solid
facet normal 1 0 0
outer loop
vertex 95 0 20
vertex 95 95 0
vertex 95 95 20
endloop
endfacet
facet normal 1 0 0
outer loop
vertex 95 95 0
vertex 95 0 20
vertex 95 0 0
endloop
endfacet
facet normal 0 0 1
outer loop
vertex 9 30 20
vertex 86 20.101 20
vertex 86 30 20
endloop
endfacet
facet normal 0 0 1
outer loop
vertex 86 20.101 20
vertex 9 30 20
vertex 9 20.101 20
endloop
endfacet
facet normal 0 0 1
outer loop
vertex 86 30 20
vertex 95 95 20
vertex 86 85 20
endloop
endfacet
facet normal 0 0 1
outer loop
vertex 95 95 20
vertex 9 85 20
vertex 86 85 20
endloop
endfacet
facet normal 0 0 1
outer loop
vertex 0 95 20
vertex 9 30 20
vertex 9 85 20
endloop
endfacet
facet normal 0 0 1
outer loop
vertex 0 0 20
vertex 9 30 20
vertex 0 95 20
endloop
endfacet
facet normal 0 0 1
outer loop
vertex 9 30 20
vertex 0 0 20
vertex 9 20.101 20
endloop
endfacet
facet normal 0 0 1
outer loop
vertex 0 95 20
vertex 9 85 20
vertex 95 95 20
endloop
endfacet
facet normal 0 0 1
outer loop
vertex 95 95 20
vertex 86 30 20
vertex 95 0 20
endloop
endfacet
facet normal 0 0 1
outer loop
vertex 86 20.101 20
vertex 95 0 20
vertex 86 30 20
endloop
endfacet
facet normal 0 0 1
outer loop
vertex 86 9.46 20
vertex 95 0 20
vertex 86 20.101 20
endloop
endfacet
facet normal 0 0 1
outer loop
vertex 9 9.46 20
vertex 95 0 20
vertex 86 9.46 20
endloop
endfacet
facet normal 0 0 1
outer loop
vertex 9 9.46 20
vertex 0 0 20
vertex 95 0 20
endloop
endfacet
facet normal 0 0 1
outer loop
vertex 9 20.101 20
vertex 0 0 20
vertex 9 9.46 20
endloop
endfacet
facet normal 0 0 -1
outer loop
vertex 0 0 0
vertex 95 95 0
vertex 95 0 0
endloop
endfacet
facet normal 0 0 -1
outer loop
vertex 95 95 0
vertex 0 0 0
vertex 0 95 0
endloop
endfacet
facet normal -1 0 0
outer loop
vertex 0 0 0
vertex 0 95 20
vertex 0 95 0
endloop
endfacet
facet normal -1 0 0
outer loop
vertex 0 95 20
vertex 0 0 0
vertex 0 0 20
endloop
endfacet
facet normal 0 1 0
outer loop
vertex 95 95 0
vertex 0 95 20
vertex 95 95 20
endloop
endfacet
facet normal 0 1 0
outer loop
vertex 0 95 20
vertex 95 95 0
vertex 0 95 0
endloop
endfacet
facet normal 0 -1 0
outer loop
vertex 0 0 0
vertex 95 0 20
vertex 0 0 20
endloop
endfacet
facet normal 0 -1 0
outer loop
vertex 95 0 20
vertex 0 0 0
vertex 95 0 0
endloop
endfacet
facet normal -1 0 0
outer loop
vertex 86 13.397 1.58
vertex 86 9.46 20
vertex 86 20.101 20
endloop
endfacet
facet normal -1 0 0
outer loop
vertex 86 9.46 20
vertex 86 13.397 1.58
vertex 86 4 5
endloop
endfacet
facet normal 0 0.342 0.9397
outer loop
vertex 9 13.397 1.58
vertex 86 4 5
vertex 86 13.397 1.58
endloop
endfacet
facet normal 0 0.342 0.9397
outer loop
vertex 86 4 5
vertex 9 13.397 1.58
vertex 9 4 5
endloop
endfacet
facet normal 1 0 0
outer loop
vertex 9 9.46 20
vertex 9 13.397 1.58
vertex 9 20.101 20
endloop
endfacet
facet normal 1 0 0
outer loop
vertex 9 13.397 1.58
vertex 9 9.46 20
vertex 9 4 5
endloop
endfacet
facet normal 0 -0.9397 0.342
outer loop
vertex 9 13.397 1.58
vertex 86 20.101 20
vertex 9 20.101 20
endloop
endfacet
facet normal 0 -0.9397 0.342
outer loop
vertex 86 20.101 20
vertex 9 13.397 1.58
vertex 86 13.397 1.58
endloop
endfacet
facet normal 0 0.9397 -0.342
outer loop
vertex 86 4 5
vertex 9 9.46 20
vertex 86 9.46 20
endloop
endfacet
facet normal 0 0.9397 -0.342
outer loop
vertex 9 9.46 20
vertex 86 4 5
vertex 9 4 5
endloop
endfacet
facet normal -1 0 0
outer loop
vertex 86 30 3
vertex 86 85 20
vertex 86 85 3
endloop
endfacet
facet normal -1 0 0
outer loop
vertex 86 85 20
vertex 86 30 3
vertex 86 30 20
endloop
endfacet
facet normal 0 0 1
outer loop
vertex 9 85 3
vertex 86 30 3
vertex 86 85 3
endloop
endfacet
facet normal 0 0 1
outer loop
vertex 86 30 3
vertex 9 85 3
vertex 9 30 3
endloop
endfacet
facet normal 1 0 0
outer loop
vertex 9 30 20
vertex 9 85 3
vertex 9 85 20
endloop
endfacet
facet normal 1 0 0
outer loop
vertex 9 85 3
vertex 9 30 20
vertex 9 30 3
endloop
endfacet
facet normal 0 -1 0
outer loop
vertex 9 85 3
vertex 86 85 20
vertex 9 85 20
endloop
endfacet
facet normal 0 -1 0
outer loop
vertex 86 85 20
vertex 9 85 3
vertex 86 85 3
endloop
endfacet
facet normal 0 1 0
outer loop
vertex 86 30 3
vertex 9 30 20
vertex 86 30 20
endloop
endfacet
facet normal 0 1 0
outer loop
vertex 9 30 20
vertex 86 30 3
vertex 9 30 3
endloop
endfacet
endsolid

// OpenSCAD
// All measurements are in mm.

// The width of the phone. Include the case if you want to dock with it on.
phone_width = 76;

// The thickness of the phone.
phone_depth = 9;

// The amount of space to leave around the phone on each side.
buffer = .5;

// How much wider than the phone to make the base.
base_width_scale = 1.25;

// The height of the base relative to the phone's width. If both scale values are the same, the base will be square.
base_height_scale = 1.25;

// The thickness of the base.
base_depth = 20;

// The calculated dimensions of the base.
base_width = phone_width * base_width_scale;
base_height = phone_width * base_height_scale;

// Angle of the phone slot. Zero is straight up.
slot_angle = 20;

// Slot height tweak.
slot_y_tweak = 4;

// Slot depth tweak.
slot_z_tweak = 5;

difference() {

    // base cube
    cube([base_width, base_height, base_depth]);

    // phone slot
    translate([
        (base_width - phone_width - (buffer * 2)) / 2,
        slot_y_tweak,
        slot_z_tweak
    ]) {
        rotate([-slot_angle, 0 , 0]) {
            cube([
                phone_width + (buffer * 2),
                phone_depth + (buffer * 2),
                100
            ]);
        }
    }

    // tray
    translate([
        (base_width - phone_width - (buffer * 2)) / 2,
        30,
        3
    ]) {
        cube([
            phone_width + (buffer * 2),
            base_height - 40,
            100
        ]);
    }

}
